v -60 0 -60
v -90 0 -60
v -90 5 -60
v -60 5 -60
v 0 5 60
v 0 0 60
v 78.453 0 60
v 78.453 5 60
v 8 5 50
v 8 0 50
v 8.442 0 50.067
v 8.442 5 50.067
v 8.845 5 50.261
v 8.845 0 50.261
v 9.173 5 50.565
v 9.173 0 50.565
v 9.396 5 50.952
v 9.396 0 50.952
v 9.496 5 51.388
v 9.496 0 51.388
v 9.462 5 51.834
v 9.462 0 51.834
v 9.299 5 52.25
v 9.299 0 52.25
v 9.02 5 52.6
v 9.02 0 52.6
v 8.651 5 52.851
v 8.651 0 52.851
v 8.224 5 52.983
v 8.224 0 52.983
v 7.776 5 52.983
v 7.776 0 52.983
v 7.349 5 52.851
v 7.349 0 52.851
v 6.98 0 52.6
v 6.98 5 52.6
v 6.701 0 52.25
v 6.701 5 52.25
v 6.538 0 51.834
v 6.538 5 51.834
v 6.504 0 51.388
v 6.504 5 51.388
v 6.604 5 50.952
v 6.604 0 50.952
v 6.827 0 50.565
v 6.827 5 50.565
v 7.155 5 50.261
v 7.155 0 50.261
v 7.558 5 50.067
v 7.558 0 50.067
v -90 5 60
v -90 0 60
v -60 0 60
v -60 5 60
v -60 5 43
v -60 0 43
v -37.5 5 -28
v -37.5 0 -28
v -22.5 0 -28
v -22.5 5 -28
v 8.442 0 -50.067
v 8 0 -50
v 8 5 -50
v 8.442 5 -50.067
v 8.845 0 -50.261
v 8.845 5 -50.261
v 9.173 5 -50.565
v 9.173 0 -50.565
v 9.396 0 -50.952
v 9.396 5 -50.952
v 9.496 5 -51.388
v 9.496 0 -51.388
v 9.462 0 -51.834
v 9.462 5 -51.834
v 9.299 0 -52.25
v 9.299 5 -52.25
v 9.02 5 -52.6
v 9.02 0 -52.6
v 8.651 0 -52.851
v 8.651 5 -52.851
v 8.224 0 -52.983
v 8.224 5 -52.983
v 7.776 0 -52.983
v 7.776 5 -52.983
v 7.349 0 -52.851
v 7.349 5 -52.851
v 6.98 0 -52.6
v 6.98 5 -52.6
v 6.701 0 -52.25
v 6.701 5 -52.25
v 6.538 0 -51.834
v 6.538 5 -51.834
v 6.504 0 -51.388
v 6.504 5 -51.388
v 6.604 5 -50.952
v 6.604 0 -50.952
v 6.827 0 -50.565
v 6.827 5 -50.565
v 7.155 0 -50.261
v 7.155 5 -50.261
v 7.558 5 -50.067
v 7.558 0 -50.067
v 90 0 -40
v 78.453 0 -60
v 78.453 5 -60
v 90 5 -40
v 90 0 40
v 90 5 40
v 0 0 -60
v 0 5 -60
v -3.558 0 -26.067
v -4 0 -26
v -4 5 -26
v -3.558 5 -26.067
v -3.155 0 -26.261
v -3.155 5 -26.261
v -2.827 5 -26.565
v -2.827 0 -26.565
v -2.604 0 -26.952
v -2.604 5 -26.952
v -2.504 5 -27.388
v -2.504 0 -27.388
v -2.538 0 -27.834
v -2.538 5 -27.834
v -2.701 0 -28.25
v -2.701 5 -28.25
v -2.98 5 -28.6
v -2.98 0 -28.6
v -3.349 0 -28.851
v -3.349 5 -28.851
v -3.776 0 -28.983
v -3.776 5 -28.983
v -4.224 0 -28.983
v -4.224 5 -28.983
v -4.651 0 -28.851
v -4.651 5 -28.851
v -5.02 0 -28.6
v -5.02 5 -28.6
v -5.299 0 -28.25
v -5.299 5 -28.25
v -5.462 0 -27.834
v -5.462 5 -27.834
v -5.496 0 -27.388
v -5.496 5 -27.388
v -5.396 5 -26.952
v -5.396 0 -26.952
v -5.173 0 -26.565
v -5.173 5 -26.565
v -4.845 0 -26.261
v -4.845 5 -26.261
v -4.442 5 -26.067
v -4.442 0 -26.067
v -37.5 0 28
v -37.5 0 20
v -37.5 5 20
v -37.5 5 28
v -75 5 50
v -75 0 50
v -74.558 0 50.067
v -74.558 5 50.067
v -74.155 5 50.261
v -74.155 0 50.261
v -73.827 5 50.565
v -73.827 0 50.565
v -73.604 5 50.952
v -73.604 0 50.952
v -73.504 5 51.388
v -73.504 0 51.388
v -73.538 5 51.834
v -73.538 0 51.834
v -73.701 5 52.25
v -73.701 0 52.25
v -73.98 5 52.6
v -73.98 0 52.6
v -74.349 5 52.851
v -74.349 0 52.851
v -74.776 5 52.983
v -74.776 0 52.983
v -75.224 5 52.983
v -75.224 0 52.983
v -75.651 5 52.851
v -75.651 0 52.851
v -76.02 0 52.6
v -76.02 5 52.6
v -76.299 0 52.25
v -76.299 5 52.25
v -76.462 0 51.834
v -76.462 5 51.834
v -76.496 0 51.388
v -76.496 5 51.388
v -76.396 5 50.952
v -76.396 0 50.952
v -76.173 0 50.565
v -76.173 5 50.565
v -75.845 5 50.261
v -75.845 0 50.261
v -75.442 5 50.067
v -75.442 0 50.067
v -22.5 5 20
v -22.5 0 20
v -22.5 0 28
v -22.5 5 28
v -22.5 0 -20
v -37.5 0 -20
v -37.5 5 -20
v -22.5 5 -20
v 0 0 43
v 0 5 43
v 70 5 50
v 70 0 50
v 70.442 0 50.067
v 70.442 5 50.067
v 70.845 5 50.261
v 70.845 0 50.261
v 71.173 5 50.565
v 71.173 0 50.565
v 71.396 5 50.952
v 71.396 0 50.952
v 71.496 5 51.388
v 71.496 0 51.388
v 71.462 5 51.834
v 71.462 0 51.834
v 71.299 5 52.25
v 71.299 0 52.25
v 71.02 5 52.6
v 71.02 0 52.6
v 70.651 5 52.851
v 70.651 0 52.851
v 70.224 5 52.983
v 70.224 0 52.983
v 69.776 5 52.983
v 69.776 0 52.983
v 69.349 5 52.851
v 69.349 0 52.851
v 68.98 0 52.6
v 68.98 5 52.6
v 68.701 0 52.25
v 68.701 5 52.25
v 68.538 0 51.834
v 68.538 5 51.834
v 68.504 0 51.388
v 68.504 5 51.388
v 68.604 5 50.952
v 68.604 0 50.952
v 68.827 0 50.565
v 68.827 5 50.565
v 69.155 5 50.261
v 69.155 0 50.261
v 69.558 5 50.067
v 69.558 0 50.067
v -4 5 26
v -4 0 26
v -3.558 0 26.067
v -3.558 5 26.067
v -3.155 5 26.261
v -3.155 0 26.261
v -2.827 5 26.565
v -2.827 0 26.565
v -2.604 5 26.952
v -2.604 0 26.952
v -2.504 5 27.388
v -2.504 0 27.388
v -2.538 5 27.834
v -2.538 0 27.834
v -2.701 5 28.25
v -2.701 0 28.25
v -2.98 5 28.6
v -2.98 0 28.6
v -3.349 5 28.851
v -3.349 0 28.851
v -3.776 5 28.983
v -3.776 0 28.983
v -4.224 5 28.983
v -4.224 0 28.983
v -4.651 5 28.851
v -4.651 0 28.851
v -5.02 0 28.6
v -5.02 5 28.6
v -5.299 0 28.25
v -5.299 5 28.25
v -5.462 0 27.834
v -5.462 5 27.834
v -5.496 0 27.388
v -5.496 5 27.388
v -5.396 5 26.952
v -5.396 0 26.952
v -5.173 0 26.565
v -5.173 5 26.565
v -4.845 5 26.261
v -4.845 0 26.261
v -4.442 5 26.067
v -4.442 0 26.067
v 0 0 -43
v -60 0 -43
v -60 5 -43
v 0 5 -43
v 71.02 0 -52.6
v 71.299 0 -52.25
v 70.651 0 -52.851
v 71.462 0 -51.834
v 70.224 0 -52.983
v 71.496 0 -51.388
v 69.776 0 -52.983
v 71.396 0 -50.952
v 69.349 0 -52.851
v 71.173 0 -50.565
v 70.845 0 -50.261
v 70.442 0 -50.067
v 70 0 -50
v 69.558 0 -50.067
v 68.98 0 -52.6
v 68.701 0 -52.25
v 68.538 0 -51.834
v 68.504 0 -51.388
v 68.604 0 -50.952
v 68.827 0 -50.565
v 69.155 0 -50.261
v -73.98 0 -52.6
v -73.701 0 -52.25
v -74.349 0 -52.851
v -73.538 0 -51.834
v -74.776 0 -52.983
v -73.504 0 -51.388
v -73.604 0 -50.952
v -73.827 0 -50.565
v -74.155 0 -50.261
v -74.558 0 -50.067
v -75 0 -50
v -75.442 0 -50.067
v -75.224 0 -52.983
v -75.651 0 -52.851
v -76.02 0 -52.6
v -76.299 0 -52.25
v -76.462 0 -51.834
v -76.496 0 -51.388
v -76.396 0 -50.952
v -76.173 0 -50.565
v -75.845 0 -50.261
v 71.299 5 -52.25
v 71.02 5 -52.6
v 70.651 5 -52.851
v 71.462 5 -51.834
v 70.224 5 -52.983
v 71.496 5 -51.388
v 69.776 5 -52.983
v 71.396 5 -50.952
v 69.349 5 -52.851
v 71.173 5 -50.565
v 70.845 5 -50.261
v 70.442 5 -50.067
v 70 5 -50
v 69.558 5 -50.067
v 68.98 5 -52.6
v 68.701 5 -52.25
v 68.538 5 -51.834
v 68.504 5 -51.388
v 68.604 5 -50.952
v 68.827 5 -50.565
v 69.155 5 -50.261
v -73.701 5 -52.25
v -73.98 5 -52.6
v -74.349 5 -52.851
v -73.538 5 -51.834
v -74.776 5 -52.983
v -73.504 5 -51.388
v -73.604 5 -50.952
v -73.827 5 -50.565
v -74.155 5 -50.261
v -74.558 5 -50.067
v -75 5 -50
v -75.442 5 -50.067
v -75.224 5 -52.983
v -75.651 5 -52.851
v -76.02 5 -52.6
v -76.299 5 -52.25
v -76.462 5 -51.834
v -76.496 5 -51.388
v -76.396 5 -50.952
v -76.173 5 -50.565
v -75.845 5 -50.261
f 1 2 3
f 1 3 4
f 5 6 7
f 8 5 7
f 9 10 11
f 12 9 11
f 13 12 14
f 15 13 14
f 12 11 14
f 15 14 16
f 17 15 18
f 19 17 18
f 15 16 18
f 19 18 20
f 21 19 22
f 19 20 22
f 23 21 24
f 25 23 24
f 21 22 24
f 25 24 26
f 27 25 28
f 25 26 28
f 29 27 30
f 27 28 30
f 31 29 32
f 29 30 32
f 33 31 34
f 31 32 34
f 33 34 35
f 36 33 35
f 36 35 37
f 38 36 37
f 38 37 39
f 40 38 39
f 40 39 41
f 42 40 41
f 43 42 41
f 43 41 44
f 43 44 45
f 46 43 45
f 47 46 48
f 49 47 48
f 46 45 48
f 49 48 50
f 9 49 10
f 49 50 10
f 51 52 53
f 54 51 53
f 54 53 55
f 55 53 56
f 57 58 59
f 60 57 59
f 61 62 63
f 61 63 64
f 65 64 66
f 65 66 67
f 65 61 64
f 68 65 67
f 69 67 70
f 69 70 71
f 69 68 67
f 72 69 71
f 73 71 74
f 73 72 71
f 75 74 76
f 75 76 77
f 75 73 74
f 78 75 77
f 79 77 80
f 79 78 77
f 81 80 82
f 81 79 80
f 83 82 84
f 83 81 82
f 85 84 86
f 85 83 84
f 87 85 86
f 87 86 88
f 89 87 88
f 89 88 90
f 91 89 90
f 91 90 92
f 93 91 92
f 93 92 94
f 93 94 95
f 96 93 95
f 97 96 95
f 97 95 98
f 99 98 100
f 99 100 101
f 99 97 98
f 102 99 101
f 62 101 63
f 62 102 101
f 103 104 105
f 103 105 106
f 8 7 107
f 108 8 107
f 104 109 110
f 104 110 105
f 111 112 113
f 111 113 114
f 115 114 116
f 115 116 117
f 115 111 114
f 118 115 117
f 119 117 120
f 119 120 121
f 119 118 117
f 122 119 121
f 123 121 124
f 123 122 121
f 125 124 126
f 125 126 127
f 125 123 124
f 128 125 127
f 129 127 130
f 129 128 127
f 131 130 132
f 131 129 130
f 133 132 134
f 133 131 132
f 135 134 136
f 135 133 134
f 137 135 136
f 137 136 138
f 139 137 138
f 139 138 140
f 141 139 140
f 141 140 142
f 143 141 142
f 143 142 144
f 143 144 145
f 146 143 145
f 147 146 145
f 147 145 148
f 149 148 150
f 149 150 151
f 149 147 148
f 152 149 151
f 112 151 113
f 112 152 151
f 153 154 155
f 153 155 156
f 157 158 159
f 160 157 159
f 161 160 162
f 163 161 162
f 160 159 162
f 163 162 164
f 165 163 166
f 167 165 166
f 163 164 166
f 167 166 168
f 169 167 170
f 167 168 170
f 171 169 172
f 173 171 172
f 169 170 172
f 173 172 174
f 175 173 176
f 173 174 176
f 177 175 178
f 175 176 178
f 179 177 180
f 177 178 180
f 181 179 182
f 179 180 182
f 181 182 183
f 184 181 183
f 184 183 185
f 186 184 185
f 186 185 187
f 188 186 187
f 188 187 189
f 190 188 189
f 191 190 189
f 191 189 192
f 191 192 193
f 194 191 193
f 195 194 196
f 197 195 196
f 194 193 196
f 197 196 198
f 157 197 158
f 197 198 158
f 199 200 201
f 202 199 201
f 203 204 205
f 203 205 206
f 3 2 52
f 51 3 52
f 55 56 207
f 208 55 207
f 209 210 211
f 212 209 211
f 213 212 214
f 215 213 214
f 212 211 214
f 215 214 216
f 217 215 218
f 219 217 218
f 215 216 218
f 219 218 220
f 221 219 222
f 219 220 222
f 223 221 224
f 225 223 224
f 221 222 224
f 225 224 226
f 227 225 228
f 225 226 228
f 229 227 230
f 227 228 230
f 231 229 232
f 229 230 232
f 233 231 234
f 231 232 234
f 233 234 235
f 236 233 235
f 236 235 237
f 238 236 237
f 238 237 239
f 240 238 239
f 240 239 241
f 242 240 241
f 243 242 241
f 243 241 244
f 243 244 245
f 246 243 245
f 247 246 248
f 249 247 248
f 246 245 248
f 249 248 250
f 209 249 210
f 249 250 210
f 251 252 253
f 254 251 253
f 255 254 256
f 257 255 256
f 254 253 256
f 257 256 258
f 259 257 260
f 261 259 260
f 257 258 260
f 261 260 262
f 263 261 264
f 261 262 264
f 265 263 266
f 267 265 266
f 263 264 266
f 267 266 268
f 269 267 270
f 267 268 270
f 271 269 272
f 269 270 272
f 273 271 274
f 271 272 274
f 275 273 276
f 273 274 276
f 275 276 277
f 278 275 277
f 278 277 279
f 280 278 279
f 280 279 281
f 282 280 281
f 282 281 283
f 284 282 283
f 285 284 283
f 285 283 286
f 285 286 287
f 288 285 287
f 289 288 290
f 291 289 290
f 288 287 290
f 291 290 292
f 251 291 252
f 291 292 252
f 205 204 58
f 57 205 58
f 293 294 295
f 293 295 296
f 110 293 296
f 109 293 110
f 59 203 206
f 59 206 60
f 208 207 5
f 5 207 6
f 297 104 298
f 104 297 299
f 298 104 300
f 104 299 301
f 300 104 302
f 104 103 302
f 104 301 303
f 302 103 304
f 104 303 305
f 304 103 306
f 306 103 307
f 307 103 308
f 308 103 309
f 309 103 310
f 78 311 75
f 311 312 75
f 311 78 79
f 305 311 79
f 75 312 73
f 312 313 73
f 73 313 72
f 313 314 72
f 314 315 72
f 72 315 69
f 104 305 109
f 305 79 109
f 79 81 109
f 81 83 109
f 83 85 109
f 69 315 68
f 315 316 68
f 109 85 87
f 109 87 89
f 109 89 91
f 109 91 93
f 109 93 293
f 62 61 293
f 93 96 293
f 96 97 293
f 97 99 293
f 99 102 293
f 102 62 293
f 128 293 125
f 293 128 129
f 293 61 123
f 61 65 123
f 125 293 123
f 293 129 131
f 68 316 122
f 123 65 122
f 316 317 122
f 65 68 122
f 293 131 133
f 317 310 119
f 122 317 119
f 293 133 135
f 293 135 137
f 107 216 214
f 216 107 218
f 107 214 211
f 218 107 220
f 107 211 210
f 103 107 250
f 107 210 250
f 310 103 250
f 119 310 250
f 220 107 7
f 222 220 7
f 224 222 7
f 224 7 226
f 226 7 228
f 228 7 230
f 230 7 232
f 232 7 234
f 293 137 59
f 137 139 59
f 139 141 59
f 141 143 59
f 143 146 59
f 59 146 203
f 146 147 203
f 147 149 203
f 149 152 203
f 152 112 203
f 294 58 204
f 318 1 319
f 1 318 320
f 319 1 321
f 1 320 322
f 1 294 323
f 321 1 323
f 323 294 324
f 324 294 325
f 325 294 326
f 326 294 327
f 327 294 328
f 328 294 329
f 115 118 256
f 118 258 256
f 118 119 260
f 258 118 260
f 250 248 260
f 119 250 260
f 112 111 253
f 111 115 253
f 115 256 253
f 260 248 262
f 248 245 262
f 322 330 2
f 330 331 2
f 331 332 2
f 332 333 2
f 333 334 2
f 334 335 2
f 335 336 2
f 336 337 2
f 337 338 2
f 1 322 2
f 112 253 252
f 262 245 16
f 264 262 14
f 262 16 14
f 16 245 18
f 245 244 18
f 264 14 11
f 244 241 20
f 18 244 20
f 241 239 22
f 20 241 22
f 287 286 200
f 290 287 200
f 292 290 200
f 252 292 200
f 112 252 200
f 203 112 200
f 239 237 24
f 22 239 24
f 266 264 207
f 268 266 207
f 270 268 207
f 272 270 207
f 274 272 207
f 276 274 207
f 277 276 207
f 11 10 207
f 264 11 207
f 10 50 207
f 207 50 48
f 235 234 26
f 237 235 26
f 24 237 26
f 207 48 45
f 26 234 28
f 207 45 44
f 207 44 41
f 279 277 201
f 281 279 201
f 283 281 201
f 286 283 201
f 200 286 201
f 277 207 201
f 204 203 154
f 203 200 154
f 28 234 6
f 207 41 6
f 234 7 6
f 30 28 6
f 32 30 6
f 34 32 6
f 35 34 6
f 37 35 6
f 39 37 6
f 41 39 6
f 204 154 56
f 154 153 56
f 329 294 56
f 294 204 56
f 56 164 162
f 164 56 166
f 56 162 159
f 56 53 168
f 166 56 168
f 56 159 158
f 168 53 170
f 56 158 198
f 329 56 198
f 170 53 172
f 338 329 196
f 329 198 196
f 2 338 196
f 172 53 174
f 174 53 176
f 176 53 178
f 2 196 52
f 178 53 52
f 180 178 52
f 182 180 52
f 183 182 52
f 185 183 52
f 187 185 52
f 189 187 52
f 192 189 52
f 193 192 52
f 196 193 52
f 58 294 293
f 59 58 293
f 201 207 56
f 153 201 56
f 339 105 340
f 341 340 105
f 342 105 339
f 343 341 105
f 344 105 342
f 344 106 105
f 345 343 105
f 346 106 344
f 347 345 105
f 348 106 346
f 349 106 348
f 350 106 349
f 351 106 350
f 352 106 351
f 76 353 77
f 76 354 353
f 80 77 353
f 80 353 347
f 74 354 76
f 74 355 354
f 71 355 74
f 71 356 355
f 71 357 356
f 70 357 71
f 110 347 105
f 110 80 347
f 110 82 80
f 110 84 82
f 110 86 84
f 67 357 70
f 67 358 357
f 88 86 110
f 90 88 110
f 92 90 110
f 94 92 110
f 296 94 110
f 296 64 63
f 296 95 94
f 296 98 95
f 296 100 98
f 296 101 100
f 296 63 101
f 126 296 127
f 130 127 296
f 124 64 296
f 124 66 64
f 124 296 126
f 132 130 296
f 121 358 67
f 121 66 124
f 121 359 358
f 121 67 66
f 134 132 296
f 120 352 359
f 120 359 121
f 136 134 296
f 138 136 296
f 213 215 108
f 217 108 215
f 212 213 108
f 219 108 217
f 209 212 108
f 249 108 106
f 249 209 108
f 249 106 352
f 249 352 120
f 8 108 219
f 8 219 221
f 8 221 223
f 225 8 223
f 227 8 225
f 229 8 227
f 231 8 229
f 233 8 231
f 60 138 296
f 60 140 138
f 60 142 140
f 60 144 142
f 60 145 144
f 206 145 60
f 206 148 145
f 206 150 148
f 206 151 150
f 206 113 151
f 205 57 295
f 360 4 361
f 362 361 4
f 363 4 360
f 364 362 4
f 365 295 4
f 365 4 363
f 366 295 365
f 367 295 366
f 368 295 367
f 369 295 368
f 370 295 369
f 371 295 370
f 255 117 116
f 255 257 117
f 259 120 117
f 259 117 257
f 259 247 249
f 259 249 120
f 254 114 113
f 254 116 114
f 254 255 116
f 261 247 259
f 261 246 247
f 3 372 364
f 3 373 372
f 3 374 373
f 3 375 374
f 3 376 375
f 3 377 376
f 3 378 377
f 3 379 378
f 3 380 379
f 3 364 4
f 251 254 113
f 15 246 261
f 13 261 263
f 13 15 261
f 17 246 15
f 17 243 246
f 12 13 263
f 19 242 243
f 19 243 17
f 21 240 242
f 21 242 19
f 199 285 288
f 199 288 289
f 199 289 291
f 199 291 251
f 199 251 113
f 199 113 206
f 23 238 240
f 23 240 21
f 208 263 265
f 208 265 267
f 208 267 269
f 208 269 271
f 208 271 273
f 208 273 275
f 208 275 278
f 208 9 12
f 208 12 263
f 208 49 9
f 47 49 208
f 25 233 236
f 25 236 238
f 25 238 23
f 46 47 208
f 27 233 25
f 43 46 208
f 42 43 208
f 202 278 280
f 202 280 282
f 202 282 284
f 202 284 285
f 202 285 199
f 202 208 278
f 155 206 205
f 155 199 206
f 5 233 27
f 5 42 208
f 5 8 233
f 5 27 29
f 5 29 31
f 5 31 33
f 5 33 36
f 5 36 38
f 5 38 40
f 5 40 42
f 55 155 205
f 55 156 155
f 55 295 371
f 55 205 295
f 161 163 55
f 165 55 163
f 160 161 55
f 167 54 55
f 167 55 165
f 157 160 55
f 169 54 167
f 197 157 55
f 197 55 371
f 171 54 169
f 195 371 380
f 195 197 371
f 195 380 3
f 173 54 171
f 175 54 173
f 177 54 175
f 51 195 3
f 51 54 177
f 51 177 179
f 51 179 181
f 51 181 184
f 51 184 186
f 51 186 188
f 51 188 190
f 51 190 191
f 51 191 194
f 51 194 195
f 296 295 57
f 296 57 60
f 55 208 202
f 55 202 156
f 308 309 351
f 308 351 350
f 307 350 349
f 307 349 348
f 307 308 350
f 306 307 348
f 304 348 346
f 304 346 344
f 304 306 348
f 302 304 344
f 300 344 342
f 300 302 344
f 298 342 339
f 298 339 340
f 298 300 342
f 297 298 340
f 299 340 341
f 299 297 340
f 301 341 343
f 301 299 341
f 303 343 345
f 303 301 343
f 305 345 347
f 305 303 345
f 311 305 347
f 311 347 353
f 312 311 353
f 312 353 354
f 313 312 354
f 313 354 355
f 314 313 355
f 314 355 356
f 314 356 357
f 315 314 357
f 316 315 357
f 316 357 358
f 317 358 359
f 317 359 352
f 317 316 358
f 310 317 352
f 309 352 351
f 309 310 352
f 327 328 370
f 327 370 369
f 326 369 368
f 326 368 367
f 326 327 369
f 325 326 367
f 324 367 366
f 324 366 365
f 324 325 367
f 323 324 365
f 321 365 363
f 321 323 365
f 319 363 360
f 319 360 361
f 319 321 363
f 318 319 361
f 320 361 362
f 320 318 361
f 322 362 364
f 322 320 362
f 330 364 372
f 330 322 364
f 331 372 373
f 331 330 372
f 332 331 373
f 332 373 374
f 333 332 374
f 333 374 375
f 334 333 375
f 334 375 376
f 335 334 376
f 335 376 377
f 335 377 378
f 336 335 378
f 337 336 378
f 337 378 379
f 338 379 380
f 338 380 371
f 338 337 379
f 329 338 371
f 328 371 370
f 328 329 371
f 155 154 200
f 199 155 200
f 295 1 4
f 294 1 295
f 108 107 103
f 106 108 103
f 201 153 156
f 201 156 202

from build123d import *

# Parameters (mm, degrees)
ESQUISSE1_R        = 1.5
ESQUISSE1_W        = 15
ESQUISSE1_H        = 8
BOSS_EXTRU_1_DEPTH = 5


with BuildPart() as part:
    # Esquisse1 → Boss.-Extru.1 (new body)
    with BuildSketch(Plane(origin=(0, 0, 0), x_dir=(1, 0, 0), z_dir=(0, 1, 0))):
        Polygon((78.452994616, 60), (90, 40), (90, 0), (-90, 0), (-90, 60), (-60, 60), (-60, 43), (0, 43), (0, 60), align=None)
        with Locations(Location((-75, 51.5, 0), (0, 0, 270))):
            Circle(ESQUISSE1_R, mode=Mode.SUBTRACT)
        with Locations(Location((8, 51.5, 0), (0, 0, 270))):
            Circle(ESQUISSE1_R, mode=Mode.SUBTRACT)
        with Locations(Location((70, 51.5, 0), (0, 0, 270))):
            Circle(ESQUISSE1_R, mode=Mode.SUBTRACT)
        with Locations(Location((-4, 27.5, 0), (0, 0, 270))):
            Circle(ESQUISSE1_R, mode=Mode.SUBTRACT)
        with Locations((-30, 24)):
            Rectangle(ESQUISSE1_W, ESQUISSE1_H, mode=Mode.SUBTRACT)
    boss_extru_1 = extrude(amount=BOSS_EXTRU_1_DEPTH)

    # Symétrie1: Boss.-Extru.1 across plane
    add(boss_extru_1.mirror(Plane(origin=(-90, 5, 0), x_dir=(1, 0, 0), z_dir=(0, 0, -1))))


solid = part.part
